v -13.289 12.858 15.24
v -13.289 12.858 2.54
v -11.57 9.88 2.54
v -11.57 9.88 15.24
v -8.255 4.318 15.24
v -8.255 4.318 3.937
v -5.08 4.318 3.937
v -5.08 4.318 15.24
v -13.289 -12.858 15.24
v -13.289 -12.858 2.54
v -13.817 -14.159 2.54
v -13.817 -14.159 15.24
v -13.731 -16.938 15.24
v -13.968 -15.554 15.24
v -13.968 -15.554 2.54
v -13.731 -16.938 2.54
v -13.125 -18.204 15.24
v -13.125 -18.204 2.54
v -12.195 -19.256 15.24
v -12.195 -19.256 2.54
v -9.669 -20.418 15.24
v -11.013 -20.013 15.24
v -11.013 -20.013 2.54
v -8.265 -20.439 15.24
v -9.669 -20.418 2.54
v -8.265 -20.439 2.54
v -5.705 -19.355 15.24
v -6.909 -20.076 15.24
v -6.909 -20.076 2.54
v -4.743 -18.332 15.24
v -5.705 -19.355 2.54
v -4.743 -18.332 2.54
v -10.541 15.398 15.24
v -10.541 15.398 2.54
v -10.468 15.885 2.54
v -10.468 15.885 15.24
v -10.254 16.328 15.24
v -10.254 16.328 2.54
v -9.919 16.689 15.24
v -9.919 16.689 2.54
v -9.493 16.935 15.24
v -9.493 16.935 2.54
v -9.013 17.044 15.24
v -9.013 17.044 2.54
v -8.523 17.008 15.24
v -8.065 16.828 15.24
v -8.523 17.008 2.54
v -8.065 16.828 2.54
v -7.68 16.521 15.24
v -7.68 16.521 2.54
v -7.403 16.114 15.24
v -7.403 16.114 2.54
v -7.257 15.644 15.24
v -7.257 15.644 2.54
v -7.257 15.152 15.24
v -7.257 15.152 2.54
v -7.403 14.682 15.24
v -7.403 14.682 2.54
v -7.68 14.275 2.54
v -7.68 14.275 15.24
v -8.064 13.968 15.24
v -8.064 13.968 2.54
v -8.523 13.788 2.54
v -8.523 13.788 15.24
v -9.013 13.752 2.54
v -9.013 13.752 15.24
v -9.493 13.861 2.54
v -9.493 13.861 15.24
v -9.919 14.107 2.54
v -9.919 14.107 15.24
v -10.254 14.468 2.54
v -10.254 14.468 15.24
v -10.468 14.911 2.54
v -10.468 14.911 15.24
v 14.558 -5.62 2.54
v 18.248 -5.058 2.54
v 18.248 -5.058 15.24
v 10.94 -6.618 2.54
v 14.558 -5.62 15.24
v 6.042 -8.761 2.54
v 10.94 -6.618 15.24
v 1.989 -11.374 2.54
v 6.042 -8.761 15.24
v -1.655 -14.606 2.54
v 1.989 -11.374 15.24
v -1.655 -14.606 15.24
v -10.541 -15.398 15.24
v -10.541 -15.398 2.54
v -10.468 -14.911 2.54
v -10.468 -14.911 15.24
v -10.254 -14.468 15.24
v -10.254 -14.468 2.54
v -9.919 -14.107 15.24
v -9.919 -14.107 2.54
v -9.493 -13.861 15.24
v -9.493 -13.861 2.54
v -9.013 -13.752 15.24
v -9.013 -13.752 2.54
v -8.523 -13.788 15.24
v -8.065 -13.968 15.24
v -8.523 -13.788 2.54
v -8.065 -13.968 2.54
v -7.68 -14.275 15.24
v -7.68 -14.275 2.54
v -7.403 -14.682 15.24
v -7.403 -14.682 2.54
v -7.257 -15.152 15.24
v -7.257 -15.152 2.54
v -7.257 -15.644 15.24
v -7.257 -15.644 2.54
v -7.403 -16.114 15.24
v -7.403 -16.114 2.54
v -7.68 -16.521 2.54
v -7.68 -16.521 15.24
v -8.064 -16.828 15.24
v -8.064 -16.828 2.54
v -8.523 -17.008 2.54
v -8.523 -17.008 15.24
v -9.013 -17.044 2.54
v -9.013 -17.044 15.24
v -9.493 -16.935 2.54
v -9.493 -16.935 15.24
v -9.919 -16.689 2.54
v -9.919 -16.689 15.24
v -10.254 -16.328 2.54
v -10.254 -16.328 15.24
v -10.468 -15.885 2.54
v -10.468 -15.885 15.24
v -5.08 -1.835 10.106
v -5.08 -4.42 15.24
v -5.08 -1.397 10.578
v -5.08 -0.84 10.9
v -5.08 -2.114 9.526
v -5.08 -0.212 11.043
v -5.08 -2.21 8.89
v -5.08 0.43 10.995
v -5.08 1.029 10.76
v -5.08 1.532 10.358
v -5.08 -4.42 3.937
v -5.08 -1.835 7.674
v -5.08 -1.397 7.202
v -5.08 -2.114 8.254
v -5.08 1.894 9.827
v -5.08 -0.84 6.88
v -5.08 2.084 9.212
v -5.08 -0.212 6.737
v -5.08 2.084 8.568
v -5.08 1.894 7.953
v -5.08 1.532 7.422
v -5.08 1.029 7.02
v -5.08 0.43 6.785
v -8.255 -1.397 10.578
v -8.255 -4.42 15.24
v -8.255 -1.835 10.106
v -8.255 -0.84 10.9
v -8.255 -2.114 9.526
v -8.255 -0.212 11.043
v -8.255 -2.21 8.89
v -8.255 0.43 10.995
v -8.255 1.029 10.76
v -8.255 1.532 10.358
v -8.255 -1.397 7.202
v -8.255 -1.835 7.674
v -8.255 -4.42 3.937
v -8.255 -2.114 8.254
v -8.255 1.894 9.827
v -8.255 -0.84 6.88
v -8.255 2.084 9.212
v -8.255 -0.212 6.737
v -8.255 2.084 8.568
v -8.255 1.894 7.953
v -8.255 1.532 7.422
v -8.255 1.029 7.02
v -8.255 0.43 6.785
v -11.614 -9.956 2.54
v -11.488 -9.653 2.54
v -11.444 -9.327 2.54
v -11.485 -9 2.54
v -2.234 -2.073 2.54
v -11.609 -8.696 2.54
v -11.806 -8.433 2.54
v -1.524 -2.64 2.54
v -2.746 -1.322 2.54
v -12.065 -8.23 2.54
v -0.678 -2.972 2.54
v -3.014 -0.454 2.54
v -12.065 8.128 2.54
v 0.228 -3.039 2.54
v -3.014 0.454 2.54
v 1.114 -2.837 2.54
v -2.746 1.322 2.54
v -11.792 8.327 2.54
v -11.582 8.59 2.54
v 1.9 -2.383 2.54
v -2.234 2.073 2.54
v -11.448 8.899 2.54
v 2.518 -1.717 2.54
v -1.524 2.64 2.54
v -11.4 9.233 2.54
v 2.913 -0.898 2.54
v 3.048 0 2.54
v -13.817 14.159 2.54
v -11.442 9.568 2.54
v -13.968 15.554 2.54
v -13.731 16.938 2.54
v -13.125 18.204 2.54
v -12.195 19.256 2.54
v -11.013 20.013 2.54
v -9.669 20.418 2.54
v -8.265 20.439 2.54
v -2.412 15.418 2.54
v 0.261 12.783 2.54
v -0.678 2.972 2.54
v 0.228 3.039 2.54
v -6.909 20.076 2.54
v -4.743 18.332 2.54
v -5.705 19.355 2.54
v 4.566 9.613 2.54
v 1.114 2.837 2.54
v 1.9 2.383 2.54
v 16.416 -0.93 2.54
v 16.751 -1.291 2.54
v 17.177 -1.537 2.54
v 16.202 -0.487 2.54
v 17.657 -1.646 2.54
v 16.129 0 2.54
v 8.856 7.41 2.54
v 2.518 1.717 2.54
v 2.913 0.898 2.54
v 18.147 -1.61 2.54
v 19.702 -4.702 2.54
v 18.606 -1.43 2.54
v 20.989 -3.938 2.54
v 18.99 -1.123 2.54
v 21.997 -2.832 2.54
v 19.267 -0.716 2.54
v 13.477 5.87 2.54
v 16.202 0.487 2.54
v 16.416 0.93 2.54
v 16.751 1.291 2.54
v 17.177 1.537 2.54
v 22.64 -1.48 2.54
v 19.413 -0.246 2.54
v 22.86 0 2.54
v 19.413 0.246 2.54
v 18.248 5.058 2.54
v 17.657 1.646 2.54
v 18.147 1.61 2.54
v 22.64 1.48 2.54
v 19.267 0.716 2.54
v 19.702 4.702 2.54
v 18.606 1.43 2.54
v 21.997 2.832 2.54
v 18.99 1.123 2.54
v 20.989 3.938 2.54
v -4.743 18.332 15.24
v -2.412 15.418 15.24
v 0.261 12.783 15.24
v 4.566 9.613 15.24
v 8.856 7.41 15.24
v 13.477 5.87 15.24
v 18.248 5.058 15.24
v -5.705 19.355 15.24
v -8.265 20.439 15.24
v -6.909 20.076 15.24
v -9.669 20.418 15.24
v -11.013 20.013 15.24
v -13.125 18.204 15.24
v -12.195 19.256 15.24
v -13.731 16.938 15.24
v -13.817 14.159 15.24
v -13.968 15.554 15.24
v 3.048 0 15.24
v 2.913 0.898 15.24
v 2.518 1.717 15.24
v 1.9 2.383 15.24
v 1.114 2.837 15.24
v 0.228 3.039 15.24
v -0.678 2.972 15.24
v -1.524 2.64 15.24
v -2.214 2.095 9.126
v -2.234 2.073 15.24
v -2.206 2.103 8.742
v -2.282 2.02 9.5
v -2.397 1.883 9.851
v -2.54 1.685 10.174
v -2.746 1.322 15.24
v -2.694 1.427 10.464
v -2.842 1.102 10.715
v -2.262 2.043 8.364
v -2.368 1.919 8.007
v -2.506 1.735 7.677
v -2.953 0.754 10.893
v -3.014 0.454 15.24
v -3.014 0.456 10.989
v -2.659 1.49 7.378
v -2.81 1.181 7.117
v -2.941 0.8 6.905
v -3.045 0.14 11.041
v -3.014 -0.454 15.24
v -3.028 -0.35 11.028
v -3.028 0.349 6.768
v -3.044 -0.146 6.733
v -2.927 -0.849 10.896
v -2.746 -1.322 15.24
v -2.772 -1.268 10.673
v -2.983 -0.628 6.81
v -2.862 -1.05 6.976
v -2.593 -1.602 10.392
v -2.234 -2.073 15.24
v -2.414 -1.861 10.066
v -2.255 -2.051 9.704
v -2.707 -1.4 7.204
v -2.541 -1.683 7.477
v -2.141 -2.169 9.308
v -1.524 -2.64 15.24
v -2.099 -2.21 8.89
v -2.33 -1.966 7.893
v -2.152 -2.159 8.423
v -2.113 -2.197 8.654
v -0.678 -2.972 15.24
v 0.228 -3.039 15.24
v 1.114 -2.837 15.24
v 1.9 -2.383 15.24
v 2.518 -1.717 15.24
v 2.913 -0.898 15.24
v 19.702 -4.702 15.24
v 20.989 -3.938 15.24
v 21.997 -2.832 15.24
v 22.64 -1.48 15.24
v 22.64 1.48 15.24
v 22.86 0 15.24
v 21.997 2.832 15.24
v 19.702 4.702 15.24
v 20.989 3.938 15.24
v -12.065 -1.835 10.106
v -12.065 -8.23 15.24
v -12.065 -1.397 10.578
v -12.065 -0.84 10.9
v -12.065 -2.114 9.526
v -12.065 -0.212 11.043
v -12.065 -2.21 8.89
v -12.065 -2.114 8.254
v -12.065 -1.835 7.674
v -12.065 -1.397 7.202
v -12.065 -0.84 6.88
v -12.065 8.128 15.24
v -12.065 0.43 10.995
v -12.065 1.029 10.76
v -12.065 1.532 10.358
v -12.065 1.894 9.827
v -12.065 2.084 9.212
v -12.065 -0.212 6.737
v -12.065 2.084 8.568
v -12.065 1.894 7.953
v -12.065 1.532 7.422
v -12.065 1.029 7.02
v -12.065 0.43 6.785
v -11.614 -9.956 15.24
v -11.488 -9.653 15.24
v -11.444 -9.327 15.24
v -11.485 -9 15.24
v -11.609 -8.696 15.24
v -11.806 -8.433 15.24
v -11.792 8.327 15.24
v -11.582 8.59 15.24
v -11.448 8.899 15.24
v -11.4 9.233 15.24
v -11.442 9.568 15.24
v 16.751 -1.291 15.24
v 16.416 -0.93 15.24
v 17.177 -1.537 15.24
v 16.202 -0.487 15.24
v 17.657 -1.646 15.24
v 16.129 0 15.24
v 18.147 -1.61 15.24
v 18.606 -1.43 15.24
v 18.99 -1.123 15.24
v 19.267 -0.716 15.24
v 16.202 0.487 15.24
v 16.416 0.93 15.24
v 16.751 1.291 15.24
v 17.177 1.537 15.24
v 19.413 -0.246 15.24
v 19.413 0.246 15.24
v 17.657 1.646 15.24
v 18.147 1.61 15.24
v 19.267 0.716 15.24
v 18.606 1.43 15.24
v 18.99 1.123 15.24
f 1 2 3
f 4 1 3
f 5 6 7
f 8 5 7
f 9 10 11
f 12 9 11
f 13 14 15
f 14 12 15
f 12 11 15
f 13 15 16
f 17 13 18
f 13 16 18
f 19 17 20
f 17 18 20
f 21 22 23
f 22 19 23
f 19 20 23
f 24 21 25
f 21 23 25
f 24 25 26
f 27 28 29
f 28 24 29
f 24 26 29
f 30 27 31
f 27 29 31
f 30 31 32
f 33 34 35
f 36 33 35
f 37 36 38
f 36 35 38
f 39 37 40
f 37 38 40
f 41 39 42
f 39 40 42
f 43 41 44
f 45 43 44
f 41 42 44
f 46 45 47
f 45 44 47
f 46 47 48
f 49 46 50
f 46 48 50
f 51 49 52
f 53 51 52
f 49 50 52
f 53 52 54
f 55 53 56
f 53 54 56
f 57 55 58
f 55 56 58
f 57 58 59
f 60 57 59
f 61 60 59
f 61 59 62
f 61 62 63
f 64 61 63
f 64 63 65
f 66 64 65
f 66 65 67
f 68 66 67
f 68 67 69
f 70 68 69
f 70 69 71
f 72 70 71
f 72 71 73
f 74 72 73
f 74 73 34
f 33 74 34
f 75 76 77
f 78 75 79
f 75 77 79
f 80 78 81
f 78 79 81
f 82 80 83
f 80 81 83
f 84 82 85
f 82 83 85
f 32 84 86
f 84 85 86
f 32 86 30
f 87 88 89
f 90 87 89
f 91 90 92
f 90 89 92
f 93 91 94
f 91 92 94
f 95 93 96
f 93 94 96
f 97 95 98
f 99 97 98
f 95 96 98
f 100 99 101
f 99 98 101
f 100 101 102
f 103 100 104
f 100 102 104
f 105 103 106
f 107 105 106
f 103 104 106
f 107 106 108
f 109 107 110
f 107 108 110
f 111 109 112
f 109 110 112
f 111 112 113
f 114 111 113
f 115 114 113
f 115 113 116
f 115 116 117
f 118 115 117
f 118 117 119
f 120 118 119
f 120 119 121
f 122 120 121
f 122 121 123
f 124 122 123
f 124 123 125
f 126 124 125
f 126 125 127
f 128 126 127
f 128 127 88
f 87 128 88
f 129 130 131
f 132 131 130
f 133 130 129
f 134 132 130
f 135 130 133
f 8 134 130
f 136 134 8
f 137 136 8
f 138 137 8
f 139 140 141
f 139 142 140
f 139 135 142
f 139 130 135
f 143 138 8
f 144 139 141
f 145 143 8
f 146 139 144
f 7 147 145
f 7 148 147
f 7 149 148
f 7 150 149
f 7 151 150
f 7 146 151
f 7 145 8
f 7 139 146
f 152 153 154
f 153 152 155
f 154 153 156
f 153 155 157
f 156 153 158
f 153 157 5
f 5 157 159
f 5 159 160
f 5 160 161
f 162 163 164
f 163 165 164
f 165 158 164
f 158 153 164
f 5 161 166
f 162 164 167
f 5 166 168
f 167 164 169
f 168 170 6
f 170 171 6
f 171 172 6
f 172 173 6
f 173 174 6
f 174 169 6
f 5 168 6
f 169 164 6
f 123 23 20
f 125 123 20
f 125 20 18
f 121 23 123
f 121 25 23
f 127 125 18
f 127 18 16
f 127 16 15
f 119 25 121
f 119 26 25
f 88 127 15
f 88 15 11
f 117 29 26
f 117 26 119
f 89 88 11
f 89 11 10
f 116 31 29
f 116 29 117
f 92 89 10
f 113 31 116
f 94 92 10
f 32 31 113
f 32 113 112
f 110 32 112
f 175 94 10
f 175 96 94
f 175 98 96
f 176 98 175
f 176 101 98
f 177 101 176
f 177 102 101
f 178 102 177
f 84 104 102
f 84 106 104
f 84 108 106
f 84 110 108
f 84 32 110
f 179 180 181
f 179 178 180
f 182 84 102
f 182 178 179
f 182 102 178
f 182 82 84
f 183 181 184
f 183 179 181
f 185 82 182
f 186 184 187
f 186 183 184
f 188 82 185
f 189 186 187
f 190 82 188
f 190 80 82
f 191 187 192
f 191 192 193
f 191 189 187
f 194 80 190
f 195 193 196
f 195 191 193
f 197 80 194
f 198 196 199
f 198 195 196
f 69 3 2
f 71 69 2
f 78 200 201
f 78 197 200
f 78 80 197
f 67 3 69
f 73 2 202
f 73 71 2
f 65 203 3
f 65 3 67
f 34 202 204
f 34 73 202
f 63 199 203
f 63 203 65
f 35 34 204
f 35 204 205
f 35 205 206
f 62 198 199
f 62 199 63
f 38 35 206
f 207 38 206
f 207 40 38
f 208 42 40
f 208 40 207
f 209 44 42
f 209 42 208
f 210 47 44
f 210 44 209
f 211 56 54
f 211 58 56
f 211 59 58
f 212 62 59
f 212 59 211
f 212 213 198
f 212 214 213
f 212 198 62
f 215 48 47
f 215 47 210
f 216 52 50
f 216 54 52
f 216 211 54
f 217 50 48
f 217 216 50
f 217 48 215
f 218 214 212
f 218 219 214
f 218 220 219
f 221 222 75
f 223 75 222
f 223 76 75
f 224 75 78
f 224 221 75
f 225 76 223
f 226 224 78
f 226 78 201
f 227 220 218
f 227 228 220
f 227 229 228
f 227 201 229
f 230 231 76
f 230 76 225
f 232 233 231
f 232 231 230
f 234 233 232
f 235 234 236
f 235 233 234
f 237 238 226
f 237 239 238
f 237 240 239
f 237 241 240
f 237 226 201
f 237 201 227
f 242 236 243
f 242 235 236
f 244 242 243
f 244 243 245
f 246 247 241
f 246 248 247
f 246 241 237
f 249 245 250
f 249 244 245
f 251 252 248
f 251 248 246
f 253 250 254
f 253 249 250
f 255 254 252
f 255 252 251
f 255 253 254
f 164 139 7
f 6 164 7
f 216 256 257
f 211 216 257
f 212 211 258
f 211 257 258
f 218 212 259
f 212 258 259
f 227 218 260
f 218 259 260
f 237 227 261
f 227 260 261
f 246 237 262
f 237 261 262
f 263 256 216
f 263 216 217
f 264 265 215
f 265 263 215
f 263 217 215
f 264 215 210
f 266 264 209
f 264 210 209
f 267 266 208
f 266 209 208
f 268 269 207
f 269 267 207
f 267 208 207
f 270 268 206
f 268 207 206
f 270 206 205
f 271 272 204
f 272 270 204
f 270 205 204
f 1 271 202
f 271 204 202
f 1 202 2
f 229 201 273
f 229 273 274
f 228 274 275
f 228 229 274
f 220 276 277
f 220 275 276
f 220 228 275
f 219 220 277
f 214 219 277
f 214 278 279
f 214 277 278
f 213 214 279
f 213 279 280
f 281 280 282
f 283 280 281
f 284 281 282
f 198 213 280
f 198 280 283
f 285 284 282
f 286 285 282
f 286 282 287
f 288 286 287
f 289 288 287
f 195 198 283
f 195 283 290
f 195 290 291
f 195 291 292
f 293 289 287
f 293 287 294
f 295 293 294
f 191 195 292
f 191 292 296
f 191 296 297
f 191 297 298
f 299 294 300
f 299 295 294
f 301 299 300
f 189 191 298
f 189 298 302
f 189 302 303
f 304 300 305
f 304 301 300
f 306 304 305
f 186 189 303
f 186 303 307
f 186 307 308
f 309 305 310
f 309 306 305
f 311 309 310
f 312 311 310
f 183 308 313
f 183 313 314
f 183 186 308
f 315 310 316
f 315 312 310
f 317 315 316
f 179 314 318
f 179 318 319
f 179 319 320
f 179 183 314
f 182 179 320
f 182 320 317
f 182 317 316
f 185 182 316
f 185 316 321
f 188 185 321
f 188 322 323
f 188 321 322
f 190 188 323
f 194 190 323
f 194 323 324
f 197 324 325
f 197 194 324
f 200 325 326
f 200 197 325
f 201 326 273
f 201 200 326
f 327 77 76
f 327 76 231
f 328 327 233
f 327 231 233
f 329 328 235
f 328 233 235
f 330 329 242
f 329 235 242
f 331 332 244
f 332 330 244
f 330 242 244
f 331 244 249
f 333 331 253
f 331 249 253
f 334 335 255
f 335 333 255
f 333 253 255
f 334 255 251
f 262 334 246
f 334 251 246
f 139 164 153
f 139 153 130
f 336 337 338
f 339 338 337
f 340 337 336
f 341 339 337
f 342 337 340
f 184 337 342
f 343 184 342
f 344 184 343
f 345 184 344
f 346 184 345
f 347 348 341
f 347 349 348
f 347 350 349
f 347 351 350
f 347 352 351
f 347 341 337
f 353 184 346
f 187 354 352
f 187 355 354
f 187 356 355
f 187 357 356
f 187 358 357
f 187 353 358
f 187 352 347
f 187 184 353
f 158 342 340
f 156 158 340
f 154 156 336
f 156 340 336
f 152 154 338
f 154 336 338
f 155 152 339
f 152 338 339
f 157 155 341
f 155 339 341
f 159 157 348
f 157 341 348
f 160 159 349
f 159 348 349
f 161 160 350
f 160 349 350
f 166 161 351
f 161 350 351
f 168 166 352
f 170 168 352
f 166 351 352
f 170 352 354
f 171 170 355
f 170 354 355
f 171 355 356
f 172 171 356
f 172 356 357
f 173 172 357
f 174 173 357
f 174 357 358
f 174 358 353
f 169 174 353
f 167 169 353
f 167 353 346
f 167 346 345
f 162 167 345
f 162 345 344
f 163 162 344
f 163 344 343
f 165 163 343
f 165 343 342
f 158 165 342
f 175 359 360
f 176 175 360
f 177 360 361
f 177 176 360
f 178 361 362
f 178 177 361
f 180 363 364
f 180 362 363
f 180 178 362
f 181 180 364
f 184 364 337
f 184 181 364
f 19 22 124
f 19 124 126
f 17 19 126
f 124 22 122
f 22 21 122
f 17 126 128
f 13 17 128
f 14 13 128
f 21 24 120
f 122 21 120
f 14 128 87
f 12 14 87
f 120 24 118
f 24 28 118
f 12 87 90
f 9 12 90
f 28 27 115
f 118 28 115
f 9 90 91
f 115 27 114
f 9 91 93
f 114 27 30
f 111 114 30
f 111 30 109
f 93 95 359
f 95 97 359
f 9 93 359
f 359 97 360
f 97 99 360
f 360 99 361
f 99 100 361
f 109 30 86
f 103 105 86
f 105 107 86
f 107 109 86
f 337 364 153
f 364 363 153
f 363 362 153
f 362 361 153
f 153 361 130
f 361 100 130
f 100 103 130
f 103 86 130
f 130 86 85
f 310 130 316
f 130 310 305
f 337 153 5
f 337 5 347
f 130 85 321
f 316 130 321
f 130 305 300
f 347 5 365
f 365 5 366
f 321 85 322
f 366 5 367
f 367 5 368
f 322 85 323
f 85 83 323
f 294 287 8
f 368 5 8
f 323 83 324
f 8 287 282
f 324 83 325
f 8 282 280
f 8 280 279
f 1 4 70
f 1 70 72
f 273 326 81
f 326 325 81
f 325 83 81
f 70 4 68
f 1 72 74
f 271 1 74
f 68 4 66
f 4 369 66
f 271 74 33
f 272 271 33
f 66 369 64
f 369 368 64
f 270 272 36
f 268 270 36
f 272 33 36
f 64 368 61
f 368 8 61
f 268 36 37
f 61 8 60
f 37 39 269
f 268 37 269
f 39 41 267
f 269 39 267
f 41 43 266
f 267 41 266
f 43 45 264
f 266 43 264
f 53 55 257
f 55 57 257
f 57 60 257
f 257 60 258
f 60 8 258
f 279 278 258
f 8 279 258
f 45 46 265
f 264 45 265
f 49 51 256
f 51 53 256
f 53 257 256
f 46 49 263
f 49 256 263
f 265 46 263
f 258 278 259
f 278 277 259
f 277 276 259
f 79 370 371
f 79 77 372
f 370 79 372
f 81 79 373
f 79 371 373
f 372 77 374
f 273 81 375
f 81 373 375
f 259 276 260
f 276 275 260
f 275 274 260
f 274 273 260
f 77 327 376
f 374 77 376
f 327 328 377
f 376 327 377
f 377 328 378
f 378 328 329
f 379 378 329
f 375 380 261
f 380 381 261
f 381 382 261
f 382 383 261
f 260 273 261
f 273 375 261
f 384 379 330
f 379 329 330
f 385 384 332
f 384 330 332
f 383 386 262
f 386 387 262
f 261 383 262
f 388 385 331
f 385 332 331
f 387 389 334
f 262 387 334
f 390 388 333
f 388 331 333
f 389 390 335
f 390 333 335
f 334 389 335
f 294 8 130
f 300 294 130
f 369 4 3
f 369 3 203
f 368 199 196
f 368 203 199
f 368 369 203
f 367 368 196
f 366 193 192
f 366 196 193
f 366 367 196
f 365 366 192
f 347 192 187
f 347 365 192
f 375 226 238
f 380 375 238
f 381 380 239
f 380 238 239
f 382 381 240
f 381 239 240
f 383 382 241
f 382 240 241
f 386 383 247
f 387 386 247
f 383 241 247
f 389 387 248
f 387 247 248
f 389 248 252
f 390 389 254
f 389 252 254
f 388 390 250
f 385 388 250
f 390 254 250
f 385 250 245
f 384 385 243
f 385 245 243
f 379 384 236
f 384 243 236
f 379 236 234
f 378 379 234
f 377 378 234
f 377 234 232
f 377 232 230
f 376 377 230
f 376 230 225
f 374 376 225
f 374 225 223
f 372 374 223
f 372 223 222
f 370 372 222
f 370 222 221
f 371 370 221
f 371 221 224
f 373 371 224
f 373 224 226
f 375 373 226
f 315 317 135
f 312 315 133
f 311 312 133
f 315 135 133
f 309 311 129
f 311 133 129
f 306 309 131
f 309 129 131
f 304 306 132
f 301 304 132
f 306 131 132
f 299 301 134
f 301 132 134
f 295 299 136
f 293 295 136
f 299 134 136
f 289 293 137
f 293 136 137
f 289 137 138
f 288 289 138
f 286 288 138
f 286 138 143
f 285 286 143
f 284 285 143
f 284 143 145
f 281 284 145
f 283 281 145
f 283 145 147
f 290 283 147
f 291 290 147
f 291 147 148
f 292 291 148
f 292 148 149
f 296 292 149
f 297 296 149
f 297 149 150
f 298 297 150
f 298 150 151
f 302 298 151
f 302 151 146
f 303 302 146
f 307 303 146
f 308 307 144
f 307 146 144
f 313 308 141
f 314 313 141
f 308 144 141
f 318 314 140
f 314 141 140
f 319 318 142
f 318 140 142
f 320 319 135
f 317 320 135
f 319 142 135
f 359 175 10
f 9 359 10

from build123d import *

# Parameters (mm, degrees)
SKETCH1_R               = 3.048
SKETCH1_W               = 3.175
SKETCH1_H               = 8.7376
BOSS_EXTRUDE1_DEPTH     = 17.78
SKETCH3_W               = 3.937
SKETCH3_H               = 8.7376
BOSS_EXTRUDE2_DEPTH     = 3.175
SKETCH5_R               = 1.651
SKETCH5_R_2             = 3.048
BOSS_EXTRUDE3_DEPTH     = 17.78
FILLET1_R               = 31.75
FILLET2_R               = 1.27
SKETCH2_R               = 2.159
CUT_EXTRUDE2_DEPTH      = 12.7
CUT_EXTRUDE3_DEPTH      = 45.217979663
CUT_EXTRUDE3_DEPTH_BACK = 45.217979663
SKETCH7_W               = 24.098797772
SKETCH7_H               = 63.864925988
SKETCH7_W_2             = 12.7
SKETCH7_H_2             = 50.8


with BuildPart() as part:
    # Sketch1 → Boss-Extrude1 (new body)
    with BuildSketch(Plane.XY):
        with BuildLine():
            Line((-12.065, 8.128), (-1.27, 8.128))
            Line((-1.27, 8.128), (3.448633975, 4.557208434))
            ThreePointArc((3.448633975, 4.557208434), (5.712149959, 0.180465622), (3.72942373, -4.33042996))
            Line((3.72942373, -4.33042996), (-1.27, -8.2296))
            Line((-1.27, -8.2296), (-12.065, -8.2296))
            Line((-12.065, -8.2296), (-12.065, 8.128))
        make_face()
        Circle(SKETCH1_R, mode=Mode.SUBTRACT)
        with Locations((-6.6675, -0.0508)):
            Rectangle(SKETCH1_W, SKETCH1_H, mode=Mode.SUBTRACT)
    extrude(amount=BOSS_EXTRUDE1_DEPTH)

    # Sketch3 → Boss-Extrude2 (add)
    with BuildSketch(Plane.ZY.offset(5.08)):
        with Locations((1.9685, -0.0508)):
            Rectangle(SKETCH3_W, SKETCH3_H)
    extrude(amount=BOSS_EXTRUDE2_DEPTH)

    # Sketch5 → Boss-Extrude3 (add)
    with BuildSketch(Plane(origin=(0, 0, 0), x_dir=(-1, 0, 0), z_dir=(0, 0, -1))):
        with BuildLine():
            Line((-2.932939367, 5.08), (4.490590949, 17.937931679))
            ThreePointArc((4.490590949, 17.937931679), (11.43, 19.797340731), (13.289409051, 12.857931679))
            Line((13.289409051, 12.857931679), (8.652171134, 4.826))
            Line((8.652171134, 4.826), (5.08, 4.826))
            Line((5.08, 4.826), (5.08, -4.4196))
            Line((5.08, -4.4196), (8.417535985, -4.4196))
            Line((8.417535985, -4.4196), (13.289409051, -12.857931679))
            ThreePointArc((13.289409051, -12.857931679), (11.43, -19.797340731), (4.490590949, -17.937931679))
            Line((4.490590949, -17.937931679), (-2.932939367, -5.08))
            Line((-2.932939367, -5.08), (-17.78, -5.08))
            ThreePointArc((-17.78, -5.08), (-22.86, 0), (-17.78, 5.08))
            Line((-17.78, 5.08), (-2.932939367, 5.08))
        make_face()
        with Locations((8.89, 15.397931679)):
            Circle(SKETCH5_R, mode=Mode.SUBTRACT)
        with Locations((8.89, -15.397931679)):
            Circle(SKETCH5_R, mode=Mode.SUBTRACT)
        with Locations((-17.78, 0)):
            Circle(SKETCH5_R, mode=Mode.SUBTRACT)
        with Locations(Location((0, 0, 0), (0, 0, 180))):
            Circle(SKETCH5_R_2, mode=Mode.SUBTRACT)
    extrude(amount=-BOSS_EXTRUDE3_DEPTH)

    # Fillet1
    fillet1_edges = [part.edges().sort_by_distance(p)[0] for p in [
        (2.932939367, -5.08, 8.89),
        (2.932939367, 5.08, 8.89),
    ]]
    fillet(fillet1_edges, radius=FILLET1_R)

    # Fillet2
    # the kernel refuses this fillet: 1.27 mm, written as the material it adds along each edge
    with BuildSketch(Plane(origin=(-10.558581723, 8.128, 17.78), x_dir=(-0.4999999999999911, 0.8660254037844438, 0), z_dir=(0, 0, -1))) as fillet2_piece_1:
        with BuildLine():
            CenterArc((2.022737824, -1.27), FILLET2_R, 90, 91.561006687)
            Line((0.753209139, -1.304596497), (0.727818565, -1.305288427))
            ThreePointArc((0.727818565, -1.305288427), (0.354607524, -0.664998248), (-0.021997045, -0.0127))
            Line((-0.021997045, -0.0127), (0, 0.0254))
            Line((0, 0.0254), (2.022737824, 0.0254))
            Line((2.022737824, 0.0254), (2.022737824, 0))
        make_face()
    extrude(amount=17.78)
    with BuildSketch(Plane(origin=(-10.61724051, -8.2296, 0), x_dir=(-1, 0, 0), z_dir=(0, 0, 1))) as fillet2_piece_2:
        with BuildLine():
            CenterArc((2.096740449, 1.091660989), FILLET2_R, 150, 89.268962563)
            Line((0.996888187, 1.726660989), (0.974891141, 1.739360989))
            Line((0.974891141, 1.739360989), (-0.021997045, 0.0127))
            Line((-0.021997045, 0.0127), (0, -0.0254))
            ThreePointArc((0, -0.0254), (0.723879745, -0.0254), (1.434779871, -0.02183322))
            Line((1.434779871, -0.02183322), (1.44775949, 0))
        make_face()
    extrude(amount=17.78)

    # Sketch2 → Cut-Extrude2 (cut)
    with BuildSketch(Plane.ZY.offset(12.065)):
        with Locations(Location((8.89, -0.0508, 0), (0, 0, 270))):
            Circle(SKETCH2_R)
    extrude(amount=-CUT_EXTRUDE2_DEPTH, mode=Mode.SUBTRACT)

    # Sketch7 → Cut-Extrude3 (cut, two sides: drawn at the far end of the back side and taken through both)
    with BuildSketch(Plane.ZY.offset(12.065).offset(-CUT_EXTRUDE3_DEPTH_BACK)):
        with Locations((8.89, -0.0508)):
            Rectangle(SKETCH7_W, SKETCH7_H)
        with Locations((8.89, -0.0508)):
            Rectangle(SKETCH7_W_2, SKETCH7_H_2, mode=Mode.SUBTRACT)
    extrude(amount=CUT_EXTRUDE3_DEPTH + CUT_EXTRUDE3_DEPTH_BACK, mode=Mode.SUBTRACT)


solid = part.part
